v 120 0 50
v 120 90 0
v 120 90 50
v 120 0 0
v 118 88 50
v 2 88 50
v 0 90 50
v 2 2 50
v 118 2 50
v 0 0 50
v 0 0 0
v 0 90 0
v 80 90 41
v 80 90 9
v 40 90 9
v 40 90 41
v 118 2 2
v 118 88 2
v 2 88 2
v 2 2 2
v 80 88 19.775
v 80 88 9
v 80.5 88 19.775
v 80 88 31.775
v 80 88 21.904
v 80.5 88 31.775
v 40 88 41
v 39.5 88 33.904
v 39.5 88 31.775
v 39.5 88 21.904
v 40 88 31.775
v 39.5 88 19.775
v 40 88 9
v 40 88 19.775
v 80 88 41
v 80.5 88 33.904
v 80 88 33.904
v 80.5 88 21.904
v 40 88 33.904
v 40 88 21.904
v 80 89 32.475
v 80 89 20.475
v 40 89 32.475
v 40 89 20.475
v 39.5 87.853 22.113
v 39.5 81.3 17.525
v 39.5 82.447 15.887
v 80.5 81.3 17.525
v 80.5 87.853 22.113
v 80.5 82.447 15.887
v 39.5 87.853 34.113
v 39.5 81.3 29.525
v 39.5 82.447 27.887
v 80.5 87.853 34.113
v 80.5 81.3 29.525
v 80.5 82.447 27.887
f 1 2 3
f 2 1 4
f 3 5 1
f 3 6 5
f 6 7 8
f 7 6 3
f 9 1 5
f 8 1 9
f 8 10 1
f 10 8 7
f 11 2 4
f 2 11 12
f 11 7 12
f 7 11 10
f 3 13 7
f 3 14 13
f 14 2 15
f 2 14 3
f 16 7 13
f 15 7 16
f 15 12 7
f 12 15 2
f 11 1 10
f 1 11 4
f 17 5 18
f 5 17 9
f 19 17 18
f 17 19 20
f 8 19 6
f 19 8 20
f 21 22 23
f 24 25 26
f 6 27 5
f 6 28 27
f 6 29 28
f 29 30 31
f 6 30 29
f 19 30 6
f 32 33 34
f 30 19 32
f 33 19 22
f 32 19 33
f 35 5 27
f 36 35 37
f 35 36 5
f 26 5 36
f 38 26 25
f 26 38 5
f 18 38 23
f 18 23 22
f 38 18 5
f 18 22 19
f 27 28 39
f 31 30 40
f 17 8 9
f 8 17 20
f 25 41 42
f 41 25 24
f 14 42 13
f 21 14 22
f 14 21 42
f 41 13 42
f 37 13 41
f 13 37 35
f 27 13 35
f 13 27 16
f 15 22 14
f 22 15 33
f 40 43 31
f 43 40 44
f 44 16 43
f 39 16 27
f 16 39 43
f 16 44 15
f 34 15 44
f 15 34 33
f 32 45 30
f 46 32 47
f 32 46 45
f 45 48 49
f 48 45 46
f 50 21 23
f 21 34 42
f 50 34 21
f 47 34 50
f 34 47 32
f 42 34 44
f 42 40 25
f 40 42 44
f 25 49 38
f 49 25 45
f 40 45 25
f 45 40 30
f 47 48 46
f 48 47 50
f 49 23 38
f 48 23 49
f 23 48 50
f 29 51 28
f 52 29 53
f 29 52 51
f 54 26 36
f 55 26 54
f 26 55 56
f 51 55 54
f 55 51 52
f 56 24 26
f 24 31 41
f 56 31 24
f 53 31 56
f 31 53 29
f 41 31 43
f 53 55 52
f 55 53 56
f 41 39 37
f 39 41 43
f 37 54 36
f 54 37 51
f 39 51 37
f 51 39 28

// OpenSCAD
$fn = 32;

// ----------------------------------------------------------------------
// Vent box: louvers enclosure
// ----------------------------------------------------------------------

// --- parameters (mm) ---
box_l = 120;              // box length, X
box_w = 90;               // box width, Y
box_h = 50;               // box height, Z
wall_t = 2;               // shell wall thickness
win_l = 40;               // vent window width, X
win_h = 32;               // vent window height, Z
slat_t = 2;               // louver slat thickness
slat_d = 8;               // louver slat depth
slat_a = 35;              // louver slat angle, degrees
slat_pitch = 12;          // louver pitch
slat_yc = 85.15;          // slat centreline Y
fit_tol = 0.1;            // tolerance for press fits, mm
free_tol = 0.3;           // tolerance for clearance fits, mm

win_z0 = (box_h - win_h) / 2;  // window lower edge Z
n_slats = 2;  // louver count
slat_z0 = win_z0 + (win_h - (n_slats - 1) * slat_pitch) / 2;

difference() {
  union() {
    difference() {
      cube([box_l, box_w, box_h]);
  translate([wall_t, wall_t, wall_t])
    cube([box_l - 2 * wall_t, box_w - 2 * wall_t, box_h]);
  translate([(box_l - win_l) / 2, box_w - wall_t - 1, win_z0])
    cube([win_l, wall_t + 2, win_h]);
    }
    for (i = [0 : n_slats - 1])
      translate([box_l / 2, slat_yc, slat_z0 + i * slat_pitch])
        rotate([slat_a, 0, 0])
          cube([win_l + 1, slat_d, slat_t], center = true);
  }
}
